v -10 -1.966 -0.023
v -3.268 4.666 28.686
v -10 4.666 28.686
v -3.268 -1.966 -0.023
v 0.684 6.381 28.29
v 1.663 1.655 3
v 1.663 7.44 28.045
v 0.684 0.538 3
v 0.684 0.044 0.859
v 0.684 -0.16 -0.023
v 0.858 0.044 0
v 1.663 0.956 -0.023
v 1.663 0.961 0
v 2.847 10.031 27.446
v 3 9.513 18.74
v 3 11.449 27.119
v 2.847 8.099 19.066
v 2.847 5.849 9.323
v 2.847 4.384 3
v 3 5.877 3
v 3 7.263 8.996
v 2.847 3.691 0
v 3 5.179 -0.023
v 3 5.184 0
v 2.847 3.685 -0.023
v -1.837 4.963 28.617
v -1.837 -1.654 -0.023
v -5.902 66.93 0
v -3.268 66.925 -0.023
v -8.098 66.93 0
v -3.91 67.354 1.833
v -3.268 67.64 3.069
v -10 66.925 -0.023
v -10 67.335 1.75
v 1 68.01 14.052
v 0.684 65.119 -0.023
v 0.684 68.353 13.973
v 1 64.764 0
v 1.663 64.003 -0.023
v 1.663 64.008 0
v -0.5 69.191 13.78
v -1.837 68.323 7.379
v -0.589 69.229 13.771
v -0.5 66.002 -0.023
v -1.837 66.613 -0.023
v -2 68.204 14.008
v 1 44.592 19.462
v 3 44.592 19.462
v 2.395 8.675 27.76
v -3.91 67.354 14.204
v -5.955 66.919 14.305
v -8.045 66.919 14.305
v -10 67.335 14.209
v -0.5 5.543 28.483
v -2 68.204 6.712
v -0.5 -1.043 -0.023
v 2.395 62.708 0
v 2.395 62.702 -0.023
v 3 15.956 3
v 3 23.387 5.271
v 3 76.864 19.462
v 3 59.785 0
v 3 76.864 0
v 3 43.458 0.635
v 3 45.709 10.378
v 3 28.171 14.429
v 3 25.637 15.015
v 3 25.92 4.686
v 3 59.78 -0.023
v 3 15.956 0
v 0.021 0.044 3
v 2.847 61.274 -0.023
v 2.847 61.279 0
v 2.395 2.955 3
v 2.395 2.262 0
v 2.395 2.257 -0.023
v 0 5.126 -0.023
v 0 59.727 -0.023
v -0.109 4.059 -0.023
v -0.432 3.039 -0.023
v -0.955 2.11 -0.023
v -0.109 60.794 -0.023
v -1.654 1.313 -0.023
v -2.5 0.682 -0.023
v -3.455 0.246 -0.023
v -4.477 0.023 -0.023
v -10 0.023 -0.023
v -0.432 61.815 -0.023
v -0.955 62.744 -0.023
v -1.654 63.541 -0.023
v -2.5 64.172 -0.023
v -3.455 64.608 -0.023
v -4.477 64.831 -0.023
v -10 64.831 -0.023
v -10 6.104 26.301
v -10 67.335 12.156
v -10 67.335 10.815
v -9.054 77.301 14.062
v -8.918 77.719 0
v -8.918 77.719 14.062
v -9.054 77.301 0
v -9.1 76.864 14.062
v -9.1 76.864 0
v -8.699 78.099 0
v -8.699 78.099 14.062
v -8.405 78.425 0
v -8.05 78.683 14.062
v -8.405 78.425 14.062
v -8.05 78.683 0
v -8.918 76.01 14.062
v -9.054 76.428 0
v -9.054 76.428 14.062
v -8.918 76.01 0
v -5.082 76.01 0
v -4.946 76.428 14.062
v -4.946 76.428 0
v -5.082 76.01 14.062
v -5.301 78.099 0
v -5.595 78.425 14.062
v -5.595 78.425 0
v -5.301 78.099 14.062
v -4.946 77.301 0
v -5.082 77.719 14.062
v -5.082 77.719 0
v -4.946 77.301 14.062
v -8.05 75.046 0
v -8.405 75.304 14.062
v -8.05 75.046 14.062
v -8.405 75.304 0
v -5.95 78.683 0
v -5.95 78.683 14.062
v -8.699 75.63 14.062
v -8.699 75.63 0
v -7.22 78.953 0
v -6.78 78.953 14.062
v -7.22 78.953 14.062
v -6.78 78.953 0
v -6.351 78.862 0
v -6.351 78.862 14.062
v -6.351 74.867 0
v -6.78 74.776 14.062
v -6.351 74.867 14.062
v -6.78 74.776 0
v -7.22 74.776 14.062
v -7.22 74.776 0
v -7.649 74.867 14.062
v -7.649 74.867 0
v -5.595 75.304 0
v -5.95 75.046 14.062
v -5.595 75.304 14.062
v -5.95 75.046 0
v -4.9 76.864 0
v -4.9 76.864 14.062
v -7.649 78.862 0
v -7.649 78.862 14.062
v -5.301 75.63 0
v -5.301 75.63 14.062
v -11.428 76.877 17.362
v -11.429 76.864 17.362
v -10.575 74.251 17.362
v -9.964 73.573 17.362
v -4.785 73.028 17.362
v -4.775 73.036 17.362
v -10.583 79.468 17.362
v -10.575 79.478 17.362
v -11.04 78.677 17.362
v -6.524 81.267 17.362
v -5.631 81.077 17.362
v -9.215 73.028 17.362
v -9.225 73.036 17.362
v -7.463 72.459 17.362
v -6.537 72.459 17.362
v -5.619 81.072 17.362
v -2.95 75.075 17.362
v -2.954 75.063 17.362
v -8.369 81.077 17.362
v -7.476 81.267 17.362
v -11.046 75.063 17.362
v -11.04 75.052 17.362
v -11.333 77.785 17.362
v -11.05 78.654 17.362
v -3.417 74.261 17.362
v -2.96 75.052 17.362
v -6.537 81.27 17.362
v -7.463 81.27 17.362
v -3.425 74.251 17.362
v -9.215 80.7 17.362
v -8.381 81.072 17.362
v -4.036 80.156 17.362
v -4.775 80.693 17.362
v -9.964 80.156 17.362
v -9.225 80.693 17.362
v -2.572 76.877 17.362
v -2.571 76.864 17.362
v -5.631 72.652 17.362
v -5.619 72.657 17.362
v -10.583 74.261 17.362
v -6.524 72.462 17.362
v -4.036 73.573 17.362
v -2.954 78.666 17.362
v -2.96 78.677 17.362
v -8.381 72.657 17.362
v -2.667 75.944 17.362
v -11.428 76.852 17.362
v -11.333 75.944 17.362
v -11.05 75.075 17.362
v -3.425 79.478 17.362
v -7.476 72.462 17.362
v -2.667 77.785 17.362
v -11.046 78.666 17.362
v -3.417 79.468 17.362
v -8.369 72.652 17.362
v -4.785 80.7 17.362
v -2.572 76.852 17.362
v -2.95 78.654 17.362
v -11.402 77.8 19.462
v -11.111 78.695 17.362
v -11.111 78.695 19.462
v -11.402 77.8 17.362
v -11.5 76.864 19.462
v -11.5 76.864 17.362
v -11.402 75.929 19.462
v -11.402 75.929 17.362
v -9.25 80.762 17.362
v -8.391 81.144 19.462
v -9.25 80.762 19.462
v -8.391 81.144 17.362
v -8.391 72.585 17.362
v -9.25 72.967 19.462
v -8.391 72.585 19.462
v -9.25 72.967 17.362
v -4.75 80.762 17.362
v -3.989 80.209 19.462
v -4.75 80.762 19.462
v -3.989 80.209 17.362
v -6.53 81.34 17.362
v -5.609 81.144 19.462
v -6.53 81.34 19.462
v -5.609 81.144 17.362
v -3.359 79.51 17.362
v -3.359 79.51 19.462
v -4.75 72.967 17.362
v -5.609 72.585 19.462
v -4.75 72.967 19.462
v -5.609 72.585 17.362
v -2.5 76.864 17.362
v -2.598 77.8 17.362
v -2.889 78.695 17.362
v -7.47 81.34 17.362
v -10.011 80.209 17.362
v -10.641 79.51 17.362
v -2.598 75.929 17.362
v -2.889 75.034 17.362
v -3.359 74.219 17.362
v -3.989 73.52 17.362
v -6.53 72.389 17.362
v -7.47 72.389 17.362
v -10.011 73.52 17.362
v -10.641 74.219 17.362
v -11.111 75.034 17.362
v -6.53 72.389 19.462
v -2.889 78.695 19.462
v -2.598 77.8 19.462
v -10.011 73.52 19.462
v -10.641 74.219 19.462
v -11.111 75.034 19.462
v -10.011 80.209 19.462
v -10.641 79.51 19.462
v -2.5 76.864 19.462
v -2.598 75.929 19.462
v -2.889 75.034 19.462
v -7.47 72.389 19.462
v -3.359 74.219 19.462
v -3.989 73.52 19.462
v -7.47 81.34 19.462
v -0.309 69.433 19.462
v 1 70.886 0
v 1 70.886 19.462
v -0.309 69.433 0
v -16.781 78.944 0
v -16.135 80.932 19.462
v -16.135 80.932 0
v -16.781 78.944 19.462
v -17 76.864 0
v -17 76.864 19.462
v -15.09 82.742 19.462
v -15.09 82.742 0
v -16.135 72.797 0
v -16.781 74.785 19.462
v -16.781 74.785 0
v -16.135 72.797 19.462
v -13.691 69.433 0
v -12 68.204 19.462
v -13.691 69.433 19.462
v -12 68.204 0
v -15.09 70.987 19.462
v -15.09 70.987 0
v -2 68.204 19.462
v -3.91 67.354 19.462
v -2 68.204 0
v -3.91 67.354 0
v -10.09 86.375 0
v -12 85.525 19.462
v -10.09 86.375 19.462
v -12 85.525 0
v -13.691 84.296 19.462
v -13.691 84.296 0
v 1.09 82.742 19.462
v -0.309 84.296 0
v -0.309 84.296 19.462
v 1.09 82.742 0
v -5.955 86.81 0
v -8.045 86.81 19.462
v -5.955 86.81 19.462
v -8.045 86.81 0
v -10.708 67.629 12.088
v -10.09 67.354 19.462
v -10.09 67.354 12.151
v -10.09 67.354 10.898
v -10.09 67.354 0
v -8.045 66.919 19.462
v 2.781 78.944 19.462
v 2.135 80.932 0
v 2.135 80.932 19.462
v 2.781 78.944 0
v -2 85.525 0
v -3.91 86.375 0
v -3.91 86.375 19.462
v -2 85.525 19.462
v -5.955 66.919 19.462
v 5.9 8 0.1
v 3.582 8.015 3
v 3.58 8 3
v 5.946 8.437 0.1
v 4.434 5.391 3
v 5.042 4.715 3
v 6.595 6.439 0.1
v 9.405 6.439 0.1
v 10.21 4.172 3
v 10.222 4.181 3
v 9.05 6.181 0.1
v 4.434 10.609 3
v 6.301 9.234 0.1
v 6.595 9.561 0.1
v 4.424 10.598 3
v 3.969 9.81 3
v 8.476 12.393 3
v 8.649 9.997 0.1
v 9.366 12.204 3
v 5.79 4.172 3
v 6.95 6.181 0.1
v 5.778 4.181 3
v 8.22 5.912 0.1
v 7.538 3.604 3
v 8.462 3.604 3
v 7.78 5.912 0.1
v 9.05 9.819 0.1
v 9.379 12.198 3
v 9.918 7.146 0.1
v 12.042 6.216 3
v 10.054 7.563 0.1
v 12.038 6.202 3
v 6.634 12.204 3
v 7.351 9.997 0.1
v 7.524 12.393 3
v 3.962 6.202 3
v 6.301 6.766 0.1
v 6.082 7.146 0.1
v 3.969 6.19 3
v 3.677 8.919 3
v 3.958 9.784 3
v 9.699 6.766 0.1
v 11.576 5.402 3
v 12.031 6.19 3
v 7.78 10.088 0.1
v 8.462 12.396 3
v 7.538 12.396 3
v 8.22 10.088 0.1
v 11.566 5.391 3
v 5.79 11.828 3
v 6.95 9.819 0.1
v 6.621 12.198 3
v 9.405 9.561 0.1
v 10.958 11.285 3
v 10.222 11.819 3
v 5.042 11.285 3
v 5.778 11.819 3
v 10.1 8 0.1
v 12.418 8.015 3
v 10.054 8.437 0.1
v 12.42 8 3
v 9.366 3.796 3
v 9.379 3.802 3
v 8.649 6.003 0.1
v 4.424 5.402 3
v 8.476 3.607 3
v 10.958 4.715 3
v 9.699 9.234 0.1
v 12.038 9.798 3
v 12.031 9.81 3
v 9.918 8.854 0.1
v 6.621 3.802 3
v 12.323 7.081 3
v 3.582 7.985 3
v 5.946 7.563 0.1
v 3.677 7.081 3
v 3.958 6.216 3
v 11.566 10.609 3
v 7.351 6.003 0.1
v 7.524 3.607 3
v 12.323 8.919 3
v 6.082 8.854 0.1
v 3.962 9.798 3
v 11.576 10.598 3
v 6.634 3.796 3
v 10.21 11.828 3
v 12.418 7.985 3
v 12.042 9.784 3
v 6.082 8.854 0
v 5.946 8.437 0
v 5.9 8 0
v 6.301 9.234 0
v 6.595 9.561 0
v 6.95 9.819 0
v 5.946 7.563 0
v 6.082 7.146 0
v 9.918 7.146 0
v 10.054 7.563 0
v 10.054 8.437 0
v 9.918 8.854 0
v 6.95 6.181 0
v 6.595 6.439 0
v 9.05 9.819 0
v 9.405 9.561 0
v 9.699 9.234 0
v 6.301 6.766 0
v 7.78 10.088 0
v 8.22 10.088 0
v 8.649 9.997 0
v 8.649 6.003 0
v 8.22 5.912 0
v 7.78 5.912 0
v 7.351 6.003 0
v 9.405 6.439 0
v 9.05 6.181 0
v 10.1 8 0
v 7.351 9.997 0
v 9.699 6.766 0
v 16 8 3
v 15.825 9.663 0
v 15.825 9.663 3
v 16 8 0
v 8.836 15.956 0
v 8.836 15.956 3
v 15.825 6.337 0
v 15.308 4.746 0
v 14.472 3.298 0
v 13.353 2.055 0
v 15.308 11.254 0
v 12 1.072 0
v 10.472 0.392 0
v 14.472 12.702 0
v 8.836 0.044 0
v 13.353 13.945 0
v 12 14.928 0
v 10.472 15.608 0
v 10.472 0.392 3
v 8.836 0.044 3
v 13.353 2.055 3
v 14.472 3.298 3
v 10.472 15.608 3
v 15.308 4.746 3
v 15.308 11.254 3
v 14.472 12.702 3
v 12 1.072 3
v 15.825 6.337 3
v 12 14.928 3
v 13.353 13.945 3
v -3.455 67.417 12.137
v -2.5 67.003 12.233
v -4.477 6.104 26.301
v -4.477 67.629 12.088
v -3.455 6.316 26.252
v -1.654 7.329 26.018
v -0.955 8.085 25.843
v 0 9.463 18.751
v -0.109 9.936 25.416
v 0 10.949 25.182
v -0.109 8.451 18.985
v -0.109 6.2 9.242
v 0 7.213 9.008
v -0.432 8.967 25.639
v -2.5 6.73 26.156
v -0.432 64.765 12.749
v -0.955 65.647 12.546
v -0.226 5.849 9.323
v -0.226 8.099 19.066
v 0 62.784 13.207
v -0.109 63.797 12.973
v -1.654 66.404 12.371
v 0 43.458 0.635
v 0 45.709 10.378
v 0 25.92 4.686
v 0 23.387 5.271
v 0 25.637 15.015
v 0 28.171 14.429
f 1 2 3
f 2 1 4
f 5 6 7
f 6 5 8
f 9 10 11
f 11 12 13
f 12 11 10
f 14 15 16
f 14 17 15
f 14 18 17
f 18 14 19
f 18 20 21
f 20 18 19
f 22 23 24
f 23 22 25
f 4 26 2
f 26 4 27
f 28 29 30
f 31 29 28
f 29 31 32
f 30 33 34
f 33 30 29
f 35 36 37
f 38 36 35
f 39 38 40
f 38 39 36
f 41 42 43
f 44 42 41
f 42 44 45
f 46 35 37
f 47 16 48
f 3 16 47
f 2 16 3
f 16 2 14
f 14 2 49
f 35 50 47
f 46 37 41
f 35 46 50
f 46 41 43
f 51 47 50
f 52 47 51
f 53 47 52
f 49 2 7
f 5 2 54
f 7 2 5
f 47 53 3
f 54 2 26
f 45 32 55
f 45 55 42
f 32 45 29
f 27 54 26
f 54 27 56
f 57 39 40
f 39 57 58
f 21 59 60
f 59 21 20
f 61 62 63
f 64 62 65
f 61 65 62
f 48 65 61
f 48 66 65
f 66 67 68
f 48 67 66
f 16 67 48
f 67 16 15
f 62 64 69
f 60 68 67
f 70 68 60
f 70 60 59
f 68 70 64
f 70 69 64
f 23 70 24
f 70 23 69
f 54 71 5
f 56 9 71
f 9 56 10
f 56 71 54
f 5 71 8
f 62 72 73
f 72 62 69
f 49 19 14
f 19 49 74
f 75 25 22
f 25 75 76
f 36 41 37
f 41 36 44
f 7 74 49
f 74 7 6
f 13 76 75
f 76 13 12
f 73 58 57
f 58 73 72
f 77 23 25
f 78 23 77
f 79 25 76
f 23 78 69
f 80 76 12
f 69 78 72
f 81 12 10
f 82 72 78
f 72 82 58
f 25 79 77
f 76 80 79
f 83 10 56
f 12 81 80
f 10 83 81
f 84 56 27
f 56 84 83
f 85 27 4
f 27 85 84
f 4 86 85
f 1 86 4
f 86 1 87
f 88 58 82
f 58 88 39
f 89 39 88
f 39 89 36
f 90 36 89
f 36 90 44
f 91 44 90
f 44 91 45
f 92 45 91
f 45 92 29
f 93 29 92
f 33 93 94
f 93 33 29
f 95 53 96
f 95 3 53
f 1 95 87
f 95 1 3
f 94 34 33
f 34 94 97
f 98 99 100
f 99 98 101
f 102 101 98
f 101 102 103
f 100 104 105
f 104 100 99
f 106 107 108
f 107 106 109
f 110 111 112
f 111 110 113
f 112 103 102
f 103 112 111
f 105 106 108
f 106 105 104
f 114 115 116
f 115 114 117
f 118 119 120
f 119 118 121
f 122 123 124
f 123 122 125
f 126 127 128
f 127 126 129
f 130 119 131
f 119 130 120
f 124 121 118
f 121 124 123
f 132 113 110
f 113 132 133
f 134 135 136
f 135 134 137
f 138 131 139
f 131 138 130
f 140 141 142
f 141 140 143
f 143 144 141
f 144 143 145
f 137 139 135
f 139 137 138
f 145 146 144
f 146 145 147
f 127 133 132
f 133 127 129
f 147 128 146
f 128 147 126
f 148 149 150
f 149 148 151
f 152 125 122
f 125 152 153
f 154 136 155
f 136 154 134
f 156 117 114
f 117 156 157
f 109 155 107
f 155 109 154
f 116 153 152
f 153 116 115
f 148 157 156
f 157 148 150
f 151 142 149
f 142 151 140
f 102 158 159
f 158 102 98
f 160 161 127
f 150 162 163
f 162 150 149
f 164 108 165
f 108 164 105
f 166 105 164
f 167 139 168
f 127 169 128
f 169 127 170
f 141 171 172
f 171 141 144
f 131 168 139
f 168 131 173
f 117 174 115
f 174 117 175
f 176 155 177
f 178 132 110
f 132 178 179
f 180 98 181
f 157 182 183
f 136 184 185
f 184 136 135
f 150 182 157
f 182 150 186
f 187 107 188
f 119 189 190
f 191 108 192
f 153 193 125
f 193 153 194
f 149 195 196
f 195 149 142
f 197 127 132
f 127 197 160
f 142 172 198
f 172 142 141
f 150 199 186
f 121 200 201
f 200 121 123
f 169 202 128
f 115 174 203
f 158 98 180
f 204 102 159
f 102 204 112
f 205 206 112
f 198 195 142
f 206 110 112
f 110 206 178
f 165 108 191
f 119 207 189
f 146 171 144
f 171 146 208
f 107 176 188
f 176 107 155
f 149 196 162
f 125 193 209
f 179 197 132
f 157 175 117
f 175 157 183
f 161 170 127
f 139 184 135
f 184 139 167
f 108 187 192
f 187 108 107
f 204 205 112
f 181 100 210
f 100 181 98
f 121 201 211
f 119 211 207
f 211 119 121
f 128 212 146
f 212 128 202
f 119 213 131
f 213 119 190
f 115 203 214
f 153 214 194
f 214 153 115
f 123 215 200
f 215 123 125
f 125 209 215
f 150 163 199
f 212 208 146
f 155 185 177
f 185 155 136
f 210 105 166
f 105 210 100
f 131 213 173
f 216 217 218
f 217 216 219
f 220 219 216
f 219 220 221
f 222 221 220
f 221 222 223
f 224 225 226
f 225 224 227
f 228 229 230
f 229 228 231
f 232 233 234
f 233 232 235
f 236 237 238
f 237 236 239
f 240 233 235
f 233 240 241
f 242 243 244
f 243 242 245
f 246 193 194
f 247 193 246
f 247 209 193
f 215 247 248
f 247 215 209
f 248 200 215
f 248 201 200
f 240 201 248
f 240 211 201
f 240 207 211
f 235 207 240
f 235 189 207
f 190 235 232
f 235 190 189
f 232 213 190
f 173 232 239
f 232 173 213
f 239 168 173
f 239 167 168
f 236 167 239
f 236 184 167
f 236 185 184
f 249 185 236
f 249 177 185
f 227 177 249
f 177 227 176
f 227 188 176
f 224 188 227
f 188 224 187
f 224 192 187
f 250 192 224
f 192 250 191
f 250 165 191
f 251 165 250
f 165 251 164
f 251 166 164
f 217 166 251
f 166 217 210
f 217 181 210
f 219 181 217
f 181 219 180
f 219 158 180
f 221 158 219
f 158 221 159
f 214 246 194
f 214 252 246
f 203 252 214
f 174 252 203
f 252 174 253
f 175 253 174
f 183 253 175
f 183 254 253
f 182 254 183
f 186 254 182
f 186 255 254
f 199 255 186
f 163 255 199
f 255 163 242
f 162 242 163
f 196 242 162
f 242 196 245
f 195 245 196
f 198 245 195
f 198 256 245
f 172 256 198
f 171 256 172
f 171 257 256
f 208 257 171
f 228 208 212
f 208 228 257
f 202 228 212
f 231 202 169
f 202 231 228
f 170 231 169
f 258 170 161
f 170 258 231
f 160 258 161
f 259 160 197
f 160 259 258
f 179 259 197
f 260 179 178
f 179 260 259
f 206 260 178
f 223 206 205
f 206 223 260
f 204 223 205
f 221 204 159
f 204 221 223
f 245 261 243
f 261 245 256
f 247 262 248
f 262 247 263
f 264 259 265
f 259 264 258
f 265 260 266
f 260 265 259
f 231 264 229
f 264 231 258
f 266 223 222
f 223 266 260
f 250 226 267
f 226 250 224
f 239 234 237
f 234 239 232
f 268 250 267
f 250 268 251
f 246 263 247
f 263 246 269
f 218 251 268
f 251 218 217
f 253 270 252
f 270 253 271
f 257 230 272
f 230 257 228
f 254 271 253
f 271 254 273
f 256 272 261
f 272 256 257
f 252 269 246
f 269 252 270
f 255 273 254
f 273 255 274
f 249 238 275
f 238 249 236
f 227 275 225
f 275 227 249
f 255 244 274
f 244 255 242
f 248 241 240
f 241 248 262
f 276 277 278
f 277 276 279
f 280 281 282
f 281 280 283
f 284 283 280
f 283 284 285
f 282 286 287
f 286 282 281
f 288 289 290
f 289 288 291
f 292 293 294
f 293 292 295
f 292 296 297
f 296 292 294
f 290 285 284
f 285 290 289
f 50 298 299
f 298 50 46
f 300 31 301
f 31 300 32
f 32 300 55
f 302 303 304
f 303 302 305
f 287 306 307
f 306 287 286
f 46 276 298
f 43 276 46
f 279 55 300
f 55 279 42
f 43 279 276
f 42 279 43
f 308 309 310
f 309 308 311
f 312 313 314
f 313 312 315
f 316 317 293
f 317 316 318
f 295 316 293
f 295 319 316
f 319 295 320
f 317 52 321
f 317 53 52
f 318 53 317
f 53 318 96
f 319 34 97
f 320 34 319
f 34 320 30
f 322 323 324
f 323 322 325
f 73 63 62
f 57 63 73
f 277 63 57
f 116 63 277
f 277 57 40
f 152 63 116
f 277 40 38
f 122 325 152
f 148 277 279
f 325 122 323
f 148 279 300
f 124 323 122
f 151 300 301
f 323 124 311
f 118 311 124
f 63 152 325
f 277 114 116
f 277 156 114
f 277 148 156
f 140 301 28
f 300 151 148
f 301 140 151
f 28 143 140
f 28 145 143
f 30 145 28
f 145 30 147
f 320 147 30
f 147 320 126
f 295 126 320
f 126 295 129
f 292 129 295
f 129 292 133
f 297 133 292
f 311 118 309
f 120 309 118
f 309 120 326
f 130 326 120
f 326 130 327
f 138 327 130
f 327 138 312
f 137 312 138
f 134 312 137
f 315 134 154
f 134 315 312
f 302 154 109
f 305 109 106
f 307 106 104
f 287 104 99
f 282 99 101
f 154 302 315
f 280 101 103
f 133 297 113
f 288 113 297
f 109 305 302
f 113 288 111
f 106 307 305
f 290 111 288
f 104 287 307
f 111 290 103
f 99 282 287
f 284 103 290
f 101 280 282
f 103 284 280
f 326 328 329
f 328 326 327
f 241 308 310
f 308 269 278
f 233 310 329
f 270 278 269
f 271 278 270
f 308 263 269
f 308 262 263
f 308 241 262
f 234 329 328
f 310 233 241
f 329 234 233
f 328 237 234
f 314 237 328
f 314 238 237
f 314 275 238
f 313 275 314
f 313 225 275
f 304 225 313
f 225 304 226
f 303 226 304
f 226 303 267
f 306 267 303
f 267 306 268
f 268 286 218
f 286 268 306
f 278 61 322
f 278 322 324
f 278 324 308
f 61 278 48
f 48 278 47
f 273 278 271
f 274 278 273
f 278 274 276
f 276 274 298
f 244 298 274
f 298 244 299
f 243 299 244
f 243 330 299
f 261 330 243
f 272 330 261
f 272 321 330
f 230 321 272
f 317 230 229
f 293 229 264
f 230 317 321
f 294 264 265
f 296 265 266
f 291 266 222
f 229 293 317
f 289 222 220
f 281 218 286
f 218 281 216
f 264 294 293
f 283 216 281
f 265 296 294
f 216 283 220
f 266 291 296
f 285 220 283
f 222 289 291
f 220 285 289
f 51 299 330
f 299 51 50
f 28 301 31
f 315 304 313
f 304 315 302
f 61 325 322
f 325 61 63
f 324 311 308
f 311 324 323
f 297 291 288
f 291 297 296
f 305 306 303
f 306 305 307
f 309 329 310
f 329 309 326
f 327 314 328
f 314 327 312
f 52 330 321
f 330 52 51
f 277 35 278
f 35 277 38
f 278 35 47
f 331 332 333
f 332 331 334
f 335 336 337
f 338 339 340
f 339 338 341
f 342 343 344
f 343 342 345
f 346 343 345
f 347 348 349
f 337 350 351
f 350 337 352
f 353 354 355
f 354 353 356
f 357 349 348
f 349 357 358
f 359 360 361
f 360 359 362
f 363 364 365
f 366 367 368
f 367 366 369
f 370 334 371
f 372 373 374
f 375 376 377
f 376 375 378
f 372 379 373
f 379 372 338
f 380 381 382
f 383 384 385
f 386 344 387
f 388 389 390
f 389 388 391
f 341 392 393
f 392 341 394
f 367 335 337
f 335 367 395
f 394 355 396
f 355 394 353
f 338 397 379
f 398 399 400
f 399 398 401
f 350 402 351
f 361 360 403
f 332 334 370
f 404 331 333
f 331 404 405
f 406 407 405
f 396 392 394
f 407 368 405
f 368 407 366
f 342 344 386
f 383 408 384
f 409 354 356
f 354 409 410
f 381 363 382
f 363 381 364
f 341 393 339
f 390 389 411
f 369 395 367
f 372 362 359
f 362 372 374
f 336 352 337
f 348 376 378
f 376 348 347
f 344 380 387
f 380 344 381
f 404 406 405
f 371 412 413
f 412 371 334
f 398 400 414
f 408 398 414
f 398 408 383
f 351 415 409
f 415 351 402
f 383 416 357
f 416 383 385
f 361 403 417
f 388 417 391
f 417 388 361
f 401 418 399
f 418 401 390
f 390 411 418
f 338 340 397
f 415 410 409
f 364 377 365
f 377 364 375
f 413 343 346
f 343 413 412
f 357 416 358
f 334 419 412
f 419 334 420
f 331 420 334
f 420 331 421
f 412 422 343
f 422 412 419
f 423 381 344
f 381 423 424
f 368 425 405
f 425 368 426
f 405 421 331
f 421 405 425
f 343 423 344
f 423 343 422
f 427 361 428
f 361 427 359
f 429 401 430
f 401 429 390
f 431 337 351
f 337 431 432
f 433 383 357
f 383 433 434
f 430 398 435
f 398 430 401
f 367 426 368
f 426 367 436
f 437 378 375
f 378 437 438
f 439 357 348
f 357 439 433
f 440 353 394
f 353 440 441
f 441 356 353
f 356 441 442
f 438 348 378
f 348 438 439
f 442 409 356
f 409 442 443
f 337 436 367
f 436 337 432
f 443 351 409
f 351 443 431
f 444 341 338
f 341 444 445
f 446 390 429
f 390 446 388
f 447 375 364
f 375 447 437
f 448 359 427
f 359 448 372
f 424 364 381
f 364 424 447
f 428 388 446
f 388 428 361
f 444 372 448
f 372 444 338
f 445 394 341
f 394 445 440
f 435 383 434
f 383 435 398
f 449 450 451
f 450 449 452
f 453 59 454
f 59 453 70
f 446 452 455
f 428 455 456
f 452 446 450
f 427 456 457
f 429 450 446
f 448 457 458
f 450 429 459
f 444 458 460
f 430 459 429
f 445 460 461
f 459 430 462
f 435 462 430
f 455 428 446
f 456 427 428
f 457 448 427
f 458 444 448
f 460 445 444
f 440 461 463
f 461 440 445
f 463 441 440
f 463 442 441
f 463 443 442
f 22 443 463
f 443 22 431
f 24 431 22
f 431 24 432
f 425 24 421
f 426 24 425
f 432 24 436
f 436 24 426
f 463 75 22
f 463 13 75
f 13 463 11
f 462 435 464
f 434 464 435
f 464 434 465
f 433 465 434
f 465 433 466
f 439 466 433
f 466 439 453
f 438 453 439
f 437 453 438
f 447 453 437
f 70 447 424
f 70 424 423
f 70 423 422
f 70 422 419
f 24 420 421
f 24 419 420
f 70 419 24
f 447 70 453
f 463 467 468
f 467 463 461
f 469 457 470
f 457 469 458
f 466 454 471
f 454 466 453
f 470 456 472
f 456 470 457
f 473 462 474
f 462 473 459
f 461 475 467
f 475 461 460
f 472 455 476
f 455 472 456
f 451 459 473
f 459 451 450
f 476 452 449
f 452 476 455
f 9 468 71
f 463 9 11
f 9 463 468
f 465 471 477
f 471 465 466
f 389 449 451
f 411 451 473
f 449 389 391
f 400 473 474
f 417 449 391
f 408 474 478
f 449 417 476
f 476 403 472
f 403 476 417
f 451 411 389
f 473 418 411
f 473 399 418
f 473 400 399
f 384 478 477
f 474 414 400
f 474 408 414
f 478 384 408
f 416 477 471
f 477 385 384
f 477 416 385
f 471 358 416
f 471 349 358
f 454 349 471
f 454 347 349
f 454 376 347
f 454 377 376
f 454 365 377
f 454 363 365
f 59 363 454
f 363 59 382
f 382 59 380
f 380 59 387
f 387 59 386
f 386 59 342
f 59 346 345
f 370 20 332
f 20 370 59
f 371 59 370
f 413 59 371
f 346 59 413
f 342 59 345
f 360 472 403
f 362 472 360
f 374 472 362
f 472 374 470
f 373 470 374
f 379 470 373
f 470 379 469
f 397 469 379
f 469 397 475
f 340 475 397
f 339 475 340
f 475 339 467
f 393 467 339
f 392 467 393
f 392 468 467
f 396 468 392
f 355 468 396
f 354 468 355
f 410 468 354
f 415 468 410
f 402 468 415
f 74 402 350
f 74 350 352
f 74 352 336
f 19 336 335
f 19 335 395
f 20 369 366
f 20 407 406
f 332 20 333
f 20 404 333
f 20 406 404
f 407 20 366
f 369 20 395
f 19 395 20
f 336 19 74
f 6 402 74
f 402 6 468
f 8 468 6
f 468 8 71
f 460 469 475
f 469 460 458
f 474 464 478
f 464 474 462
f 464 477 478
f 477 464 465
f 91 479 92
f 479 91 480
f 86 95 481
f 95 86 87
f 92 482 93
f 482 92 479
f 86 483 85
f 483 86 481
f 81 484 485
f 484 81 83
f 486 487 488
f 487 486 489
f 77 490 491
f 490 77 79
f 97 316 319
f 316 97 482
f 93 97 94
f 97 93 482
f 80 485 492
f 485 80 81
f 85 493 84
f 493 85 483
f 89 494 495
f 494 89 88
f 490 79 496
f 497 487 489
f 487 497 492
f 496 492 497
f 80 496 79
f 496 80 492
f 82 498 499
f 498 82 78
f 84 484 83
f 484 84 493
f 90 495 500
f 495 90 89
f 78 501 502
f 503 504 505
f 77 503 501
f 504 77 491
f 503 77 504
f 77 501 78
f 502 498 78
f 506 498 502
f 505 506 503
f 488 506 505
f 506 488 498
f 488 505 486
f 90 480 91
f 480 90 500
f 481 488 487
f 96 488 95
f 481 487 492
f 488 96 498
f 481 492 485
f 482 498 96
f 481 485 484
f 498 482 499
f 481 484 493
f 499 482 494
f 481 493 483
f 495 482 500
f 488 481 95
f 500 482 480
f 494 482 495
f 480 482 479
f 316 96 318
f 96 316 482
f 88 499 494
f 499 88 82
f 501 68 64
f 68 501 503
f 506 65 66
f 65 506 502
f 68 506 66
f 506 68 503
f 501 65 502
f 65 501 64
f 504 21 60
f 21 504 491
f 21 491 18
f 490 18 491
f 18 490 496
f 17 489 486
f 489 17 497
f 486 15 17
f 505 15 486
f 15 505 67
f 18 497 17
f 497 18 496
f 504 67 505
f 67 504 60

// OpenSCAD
eps = 0.1;
$fs = 0.1;

w = 145.2;
h1 = 27;
h2 = 0.6 + 11.8;
d = 63.2;
r = 5;

a = atan((h1 - h2) / d);
echo("a", a);

screw_len = 1.25 * 25.4;
board_t = 9/16 * 25.4;
screw_h = (screw_len - board_t) + 2;

// ear
et = screw_h;                   // ear thickness
ed = 20;                        // ear diameter
el = 20 + 2;                    // ear length
ewt = 2;                        // ear wall thickness

// screw
sd1 = 9;                        // screw diameter 1
sd2 = 4.2;                      // screw diameter 2
csl = 3.4;                      // countersink depth
csd = 2;                        // countersink depth

module box_xform(h1, d) {
	rotate(180 - a, [1, 0, 0])
		translate([0, -d, -h1])
			children();
}

module box(w, h1, h2, d, r, xh=0) {
	box_xform(h1, d)
		difference() {
			hull() {
				for (x = [r, w - r], y = [r, d - r])
					translate([x, y, 0])
						cylinder(h=h1 + xh + eps, r=r);
			}
			translate([0, 0, h2])
				rotate(a, [1, 0, 0])
					translate([-eps, -eps, xh])
						cube([w + 2 * eps,
						      (d + 2 * eps) / cos(a) + 2 * eps,
						      h1 - h2]);
				}
}

module countersink_bore() {
    translate([0, 0, -eps])
        cylinder(d=sd2, h=et + eps);
    translate([0, 0, et - csd - csl])
        cylinder(d1=sd2, d2=sd1, h=csl);
    translate([0, 0, et - csd - eps])
        cylinder(d=sd1, h=csd + 2 * eps);
}

module rear_ear() {
     y = d / cos(a) + ed / 2 + 2;
	translate([ed/2 - 3, y, 0])
		difference() {
			cylinder(d=20, h=et);
			countersink_bore();
		}
	translate([-3, d/2, 0])
		cube([2, y - d/2, et]);
}

module side_ear() {
	r1 = 8;
	t = 3;
	difference() {
		hull() {
			translate([-r1, r1, 0])
				cylinder(r=r1, h=t);
			translate([0, r1, 0])
				cylinder(r=r1, h=t);
		}
		translate([-r1, r1, eps]) {
			cylinder(d1=sd2, d2=sd1, h=t);
			cylinder(d=sd2, h=3*t, center=true);
		}
	}
}

module cutouts_left() {
	box_xform(h1, d) {
		translate([-5, 39, 5.5])
			cube([3, 14, 16.5]);
		translate([-5, 41, 7.5])
			cube([10, 10, 12.5]);
		translate([-5, 24.2, 9])
			rotate(90, [0, 1, 0])
				cylinder(d=11, h=10);
	}
}

module cutouts_right() {
	box_xform(h1, d)
		for (y = [22, 42.6])
			translate([-5, y-1, 6.6])
				cube([10, 18, 10]);
}

module end_wrap_left() {
	p = 2 * sin(a);
	difference() {
		union() {
			intersection() {
				translate([-3, -2, 0])
					box(w+4, h1 + 2 + p, h2 + 2 - p, d+4, r+2);
				translate([-3, -3, -3])
					cube([13, 2*d, 2*h1,]);
			}
			rear_ear();
			side_ear();
		}
		box(w, h1, h2, d, r, xh=3);
		cutouts_left();
	}
}

module end_wrap_right() {
	p = 2 * sin(a);
	scale([-1, +1, +1])
		difference() {
			union() {
				intersection() {
					translate([-3, -2, 0])
						box(w+4, h1 + 2 + p, h2 + 2 - p, d+4, r+2);
					translate([-3, -3, -3])
						cube([13, 2*d, 2*h1,]);
				}
				rear_ear();
				side_ear();
			}
			box(w, h1, h2, d, r, xh=3);
			cutouts_right();
		}
}

//box(w, h1, h2, d, r);

//end_wrap_left();

//translate([35, 20, 0])
	end_wrap_right();
